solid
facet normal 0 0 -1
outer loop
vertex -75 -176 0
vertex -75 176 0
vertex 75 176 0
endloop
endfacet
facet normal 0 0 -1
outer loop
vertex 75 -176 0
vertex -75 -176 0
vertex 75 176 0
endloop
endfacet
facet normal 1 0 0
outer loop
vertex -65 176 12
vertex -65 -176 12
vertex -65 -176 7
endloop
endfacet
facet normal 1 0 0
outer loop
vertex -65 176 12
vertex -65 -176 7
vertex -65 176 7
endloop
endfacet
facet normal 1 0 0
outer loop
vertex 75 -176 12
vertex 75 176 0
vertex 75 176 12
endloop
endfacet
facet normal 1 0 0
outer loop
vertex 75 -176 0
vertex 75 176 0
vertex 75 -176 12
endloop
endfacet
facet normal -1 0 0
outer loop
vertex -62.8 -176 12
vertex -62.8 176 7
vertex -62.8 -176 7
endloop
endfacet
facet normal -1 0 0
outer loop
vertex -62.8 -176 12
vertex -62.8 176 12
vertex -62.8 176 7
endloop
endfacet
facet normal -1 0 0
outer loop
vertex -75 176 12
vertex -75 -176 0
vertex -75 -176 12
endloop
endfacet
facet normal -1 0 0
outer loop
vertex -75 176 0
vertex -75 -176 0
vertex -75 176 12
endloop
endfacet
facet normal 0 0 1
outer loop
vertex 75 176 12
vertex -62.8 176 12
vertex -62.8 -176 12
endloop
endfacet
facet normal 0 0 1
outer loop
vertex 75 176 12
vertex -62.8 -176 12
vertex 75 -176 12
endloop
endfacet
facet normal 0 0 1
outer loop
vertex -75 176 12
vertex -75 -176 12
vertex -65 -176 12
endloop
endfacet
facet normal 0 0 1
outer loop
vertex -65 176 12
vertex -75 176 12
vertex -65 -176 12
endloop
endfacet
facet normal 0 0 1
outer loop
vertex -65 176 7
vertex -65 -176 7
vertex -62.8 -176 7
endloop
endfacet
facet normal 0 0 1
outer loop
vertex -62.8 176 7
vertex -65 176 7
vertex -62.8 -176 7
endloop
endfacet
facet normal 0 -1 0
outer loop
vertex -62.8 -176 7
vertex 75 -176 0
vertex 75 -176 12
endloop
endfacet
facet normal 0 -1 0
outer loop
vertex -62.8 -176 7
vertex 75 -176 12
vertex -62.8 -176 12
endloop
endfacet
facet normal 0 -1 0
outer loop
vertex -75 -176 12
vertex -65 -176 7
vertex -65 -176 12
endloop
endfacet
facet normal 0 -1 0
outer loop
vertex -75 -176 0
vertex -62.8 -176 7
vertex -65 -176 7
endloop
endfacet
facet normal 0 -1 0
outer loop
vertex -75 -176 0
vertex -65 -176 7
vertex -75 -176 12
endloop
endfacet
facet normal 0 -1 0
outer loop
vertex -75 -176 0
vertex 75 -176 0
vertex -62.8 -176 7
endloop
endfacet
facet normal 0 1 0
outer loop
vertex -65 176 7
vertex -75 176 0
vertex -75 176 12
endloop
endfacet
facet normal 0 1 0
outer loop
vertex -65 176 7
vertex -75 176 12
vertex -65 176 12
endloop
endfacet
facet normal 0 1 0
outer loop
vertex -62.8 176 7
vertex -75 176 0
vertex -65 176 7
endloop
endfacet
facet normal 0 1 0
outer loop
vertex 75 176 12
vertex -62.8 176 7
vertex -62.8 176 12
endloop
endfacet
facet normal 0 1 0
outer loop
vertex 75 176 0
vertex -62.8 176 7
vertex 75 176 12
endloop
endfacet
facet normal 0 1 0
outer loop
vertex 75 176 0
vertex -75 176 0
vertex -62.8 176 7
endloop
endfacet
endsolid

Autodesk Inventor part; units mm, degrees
ref_plane "YZ Plane" through (0, 0, 0) normal (1, 0, 0) x (0, 1, 0)
ref_plane "XZ Plane" through (0, 0, 0) normal (0, 1, 0) x (-1, 0, 0)
ref_plane "XY Plane" through (0, 0, 0) normal (0, 0, 1) x (1, 0, 0)
sketch "Skizze1" plane through (0, 0, 0) normal (0, 0, 1) x (1, 0, 0)
  line L0 (-75, 176) -> (75, 176)
  line L1 (75, 176) -> (75, -176)
  line L2 (75, -176) -> (-75, -176)
  line L3 (-75, -176) -> (-75, 176)
  point P0 (0, 0)
  point P1 (0, 176)
  point P2 (-75, 0)
  dimension "d0" = 150
  dimension "d1" = 352
extrude "Extrusion1" add sketch "Skizze1" along normal blind 12
sketch "Skizze2" plane through (0, 0, 12) normal (0, 0, 1) x (1, 0, 0)
  line L0 (-75, -176) -> (75, -176) projected
  line L1 (75, -176) -> (75, 176) projected
  line L2 (75, 176) -> (-75, 176) projected
  line L3 (-75, 176) -> (-75, -176) projected
  line L4 (75, 176) -> (-75, 176) projected
  line L5 (-65, 176) -> (-62.8, 176)
  line L6 (-62.8, 176) -> (-62.8, -176)
  line L7 (-62.8, -176) -> (-65, -176)
  line L8 (-65, -176) -> (-65, 176)
  point P0 (0, 0)
  dimension "d4" = 10
  dimension "d5" = 2.2
extrude "Extrusion2" cut sketch "Skizze2" against normal blind 5 contours L8 L2 L6 L0
properties part number "Querseite_Shotclock" material "Holz (Kirsche)"
